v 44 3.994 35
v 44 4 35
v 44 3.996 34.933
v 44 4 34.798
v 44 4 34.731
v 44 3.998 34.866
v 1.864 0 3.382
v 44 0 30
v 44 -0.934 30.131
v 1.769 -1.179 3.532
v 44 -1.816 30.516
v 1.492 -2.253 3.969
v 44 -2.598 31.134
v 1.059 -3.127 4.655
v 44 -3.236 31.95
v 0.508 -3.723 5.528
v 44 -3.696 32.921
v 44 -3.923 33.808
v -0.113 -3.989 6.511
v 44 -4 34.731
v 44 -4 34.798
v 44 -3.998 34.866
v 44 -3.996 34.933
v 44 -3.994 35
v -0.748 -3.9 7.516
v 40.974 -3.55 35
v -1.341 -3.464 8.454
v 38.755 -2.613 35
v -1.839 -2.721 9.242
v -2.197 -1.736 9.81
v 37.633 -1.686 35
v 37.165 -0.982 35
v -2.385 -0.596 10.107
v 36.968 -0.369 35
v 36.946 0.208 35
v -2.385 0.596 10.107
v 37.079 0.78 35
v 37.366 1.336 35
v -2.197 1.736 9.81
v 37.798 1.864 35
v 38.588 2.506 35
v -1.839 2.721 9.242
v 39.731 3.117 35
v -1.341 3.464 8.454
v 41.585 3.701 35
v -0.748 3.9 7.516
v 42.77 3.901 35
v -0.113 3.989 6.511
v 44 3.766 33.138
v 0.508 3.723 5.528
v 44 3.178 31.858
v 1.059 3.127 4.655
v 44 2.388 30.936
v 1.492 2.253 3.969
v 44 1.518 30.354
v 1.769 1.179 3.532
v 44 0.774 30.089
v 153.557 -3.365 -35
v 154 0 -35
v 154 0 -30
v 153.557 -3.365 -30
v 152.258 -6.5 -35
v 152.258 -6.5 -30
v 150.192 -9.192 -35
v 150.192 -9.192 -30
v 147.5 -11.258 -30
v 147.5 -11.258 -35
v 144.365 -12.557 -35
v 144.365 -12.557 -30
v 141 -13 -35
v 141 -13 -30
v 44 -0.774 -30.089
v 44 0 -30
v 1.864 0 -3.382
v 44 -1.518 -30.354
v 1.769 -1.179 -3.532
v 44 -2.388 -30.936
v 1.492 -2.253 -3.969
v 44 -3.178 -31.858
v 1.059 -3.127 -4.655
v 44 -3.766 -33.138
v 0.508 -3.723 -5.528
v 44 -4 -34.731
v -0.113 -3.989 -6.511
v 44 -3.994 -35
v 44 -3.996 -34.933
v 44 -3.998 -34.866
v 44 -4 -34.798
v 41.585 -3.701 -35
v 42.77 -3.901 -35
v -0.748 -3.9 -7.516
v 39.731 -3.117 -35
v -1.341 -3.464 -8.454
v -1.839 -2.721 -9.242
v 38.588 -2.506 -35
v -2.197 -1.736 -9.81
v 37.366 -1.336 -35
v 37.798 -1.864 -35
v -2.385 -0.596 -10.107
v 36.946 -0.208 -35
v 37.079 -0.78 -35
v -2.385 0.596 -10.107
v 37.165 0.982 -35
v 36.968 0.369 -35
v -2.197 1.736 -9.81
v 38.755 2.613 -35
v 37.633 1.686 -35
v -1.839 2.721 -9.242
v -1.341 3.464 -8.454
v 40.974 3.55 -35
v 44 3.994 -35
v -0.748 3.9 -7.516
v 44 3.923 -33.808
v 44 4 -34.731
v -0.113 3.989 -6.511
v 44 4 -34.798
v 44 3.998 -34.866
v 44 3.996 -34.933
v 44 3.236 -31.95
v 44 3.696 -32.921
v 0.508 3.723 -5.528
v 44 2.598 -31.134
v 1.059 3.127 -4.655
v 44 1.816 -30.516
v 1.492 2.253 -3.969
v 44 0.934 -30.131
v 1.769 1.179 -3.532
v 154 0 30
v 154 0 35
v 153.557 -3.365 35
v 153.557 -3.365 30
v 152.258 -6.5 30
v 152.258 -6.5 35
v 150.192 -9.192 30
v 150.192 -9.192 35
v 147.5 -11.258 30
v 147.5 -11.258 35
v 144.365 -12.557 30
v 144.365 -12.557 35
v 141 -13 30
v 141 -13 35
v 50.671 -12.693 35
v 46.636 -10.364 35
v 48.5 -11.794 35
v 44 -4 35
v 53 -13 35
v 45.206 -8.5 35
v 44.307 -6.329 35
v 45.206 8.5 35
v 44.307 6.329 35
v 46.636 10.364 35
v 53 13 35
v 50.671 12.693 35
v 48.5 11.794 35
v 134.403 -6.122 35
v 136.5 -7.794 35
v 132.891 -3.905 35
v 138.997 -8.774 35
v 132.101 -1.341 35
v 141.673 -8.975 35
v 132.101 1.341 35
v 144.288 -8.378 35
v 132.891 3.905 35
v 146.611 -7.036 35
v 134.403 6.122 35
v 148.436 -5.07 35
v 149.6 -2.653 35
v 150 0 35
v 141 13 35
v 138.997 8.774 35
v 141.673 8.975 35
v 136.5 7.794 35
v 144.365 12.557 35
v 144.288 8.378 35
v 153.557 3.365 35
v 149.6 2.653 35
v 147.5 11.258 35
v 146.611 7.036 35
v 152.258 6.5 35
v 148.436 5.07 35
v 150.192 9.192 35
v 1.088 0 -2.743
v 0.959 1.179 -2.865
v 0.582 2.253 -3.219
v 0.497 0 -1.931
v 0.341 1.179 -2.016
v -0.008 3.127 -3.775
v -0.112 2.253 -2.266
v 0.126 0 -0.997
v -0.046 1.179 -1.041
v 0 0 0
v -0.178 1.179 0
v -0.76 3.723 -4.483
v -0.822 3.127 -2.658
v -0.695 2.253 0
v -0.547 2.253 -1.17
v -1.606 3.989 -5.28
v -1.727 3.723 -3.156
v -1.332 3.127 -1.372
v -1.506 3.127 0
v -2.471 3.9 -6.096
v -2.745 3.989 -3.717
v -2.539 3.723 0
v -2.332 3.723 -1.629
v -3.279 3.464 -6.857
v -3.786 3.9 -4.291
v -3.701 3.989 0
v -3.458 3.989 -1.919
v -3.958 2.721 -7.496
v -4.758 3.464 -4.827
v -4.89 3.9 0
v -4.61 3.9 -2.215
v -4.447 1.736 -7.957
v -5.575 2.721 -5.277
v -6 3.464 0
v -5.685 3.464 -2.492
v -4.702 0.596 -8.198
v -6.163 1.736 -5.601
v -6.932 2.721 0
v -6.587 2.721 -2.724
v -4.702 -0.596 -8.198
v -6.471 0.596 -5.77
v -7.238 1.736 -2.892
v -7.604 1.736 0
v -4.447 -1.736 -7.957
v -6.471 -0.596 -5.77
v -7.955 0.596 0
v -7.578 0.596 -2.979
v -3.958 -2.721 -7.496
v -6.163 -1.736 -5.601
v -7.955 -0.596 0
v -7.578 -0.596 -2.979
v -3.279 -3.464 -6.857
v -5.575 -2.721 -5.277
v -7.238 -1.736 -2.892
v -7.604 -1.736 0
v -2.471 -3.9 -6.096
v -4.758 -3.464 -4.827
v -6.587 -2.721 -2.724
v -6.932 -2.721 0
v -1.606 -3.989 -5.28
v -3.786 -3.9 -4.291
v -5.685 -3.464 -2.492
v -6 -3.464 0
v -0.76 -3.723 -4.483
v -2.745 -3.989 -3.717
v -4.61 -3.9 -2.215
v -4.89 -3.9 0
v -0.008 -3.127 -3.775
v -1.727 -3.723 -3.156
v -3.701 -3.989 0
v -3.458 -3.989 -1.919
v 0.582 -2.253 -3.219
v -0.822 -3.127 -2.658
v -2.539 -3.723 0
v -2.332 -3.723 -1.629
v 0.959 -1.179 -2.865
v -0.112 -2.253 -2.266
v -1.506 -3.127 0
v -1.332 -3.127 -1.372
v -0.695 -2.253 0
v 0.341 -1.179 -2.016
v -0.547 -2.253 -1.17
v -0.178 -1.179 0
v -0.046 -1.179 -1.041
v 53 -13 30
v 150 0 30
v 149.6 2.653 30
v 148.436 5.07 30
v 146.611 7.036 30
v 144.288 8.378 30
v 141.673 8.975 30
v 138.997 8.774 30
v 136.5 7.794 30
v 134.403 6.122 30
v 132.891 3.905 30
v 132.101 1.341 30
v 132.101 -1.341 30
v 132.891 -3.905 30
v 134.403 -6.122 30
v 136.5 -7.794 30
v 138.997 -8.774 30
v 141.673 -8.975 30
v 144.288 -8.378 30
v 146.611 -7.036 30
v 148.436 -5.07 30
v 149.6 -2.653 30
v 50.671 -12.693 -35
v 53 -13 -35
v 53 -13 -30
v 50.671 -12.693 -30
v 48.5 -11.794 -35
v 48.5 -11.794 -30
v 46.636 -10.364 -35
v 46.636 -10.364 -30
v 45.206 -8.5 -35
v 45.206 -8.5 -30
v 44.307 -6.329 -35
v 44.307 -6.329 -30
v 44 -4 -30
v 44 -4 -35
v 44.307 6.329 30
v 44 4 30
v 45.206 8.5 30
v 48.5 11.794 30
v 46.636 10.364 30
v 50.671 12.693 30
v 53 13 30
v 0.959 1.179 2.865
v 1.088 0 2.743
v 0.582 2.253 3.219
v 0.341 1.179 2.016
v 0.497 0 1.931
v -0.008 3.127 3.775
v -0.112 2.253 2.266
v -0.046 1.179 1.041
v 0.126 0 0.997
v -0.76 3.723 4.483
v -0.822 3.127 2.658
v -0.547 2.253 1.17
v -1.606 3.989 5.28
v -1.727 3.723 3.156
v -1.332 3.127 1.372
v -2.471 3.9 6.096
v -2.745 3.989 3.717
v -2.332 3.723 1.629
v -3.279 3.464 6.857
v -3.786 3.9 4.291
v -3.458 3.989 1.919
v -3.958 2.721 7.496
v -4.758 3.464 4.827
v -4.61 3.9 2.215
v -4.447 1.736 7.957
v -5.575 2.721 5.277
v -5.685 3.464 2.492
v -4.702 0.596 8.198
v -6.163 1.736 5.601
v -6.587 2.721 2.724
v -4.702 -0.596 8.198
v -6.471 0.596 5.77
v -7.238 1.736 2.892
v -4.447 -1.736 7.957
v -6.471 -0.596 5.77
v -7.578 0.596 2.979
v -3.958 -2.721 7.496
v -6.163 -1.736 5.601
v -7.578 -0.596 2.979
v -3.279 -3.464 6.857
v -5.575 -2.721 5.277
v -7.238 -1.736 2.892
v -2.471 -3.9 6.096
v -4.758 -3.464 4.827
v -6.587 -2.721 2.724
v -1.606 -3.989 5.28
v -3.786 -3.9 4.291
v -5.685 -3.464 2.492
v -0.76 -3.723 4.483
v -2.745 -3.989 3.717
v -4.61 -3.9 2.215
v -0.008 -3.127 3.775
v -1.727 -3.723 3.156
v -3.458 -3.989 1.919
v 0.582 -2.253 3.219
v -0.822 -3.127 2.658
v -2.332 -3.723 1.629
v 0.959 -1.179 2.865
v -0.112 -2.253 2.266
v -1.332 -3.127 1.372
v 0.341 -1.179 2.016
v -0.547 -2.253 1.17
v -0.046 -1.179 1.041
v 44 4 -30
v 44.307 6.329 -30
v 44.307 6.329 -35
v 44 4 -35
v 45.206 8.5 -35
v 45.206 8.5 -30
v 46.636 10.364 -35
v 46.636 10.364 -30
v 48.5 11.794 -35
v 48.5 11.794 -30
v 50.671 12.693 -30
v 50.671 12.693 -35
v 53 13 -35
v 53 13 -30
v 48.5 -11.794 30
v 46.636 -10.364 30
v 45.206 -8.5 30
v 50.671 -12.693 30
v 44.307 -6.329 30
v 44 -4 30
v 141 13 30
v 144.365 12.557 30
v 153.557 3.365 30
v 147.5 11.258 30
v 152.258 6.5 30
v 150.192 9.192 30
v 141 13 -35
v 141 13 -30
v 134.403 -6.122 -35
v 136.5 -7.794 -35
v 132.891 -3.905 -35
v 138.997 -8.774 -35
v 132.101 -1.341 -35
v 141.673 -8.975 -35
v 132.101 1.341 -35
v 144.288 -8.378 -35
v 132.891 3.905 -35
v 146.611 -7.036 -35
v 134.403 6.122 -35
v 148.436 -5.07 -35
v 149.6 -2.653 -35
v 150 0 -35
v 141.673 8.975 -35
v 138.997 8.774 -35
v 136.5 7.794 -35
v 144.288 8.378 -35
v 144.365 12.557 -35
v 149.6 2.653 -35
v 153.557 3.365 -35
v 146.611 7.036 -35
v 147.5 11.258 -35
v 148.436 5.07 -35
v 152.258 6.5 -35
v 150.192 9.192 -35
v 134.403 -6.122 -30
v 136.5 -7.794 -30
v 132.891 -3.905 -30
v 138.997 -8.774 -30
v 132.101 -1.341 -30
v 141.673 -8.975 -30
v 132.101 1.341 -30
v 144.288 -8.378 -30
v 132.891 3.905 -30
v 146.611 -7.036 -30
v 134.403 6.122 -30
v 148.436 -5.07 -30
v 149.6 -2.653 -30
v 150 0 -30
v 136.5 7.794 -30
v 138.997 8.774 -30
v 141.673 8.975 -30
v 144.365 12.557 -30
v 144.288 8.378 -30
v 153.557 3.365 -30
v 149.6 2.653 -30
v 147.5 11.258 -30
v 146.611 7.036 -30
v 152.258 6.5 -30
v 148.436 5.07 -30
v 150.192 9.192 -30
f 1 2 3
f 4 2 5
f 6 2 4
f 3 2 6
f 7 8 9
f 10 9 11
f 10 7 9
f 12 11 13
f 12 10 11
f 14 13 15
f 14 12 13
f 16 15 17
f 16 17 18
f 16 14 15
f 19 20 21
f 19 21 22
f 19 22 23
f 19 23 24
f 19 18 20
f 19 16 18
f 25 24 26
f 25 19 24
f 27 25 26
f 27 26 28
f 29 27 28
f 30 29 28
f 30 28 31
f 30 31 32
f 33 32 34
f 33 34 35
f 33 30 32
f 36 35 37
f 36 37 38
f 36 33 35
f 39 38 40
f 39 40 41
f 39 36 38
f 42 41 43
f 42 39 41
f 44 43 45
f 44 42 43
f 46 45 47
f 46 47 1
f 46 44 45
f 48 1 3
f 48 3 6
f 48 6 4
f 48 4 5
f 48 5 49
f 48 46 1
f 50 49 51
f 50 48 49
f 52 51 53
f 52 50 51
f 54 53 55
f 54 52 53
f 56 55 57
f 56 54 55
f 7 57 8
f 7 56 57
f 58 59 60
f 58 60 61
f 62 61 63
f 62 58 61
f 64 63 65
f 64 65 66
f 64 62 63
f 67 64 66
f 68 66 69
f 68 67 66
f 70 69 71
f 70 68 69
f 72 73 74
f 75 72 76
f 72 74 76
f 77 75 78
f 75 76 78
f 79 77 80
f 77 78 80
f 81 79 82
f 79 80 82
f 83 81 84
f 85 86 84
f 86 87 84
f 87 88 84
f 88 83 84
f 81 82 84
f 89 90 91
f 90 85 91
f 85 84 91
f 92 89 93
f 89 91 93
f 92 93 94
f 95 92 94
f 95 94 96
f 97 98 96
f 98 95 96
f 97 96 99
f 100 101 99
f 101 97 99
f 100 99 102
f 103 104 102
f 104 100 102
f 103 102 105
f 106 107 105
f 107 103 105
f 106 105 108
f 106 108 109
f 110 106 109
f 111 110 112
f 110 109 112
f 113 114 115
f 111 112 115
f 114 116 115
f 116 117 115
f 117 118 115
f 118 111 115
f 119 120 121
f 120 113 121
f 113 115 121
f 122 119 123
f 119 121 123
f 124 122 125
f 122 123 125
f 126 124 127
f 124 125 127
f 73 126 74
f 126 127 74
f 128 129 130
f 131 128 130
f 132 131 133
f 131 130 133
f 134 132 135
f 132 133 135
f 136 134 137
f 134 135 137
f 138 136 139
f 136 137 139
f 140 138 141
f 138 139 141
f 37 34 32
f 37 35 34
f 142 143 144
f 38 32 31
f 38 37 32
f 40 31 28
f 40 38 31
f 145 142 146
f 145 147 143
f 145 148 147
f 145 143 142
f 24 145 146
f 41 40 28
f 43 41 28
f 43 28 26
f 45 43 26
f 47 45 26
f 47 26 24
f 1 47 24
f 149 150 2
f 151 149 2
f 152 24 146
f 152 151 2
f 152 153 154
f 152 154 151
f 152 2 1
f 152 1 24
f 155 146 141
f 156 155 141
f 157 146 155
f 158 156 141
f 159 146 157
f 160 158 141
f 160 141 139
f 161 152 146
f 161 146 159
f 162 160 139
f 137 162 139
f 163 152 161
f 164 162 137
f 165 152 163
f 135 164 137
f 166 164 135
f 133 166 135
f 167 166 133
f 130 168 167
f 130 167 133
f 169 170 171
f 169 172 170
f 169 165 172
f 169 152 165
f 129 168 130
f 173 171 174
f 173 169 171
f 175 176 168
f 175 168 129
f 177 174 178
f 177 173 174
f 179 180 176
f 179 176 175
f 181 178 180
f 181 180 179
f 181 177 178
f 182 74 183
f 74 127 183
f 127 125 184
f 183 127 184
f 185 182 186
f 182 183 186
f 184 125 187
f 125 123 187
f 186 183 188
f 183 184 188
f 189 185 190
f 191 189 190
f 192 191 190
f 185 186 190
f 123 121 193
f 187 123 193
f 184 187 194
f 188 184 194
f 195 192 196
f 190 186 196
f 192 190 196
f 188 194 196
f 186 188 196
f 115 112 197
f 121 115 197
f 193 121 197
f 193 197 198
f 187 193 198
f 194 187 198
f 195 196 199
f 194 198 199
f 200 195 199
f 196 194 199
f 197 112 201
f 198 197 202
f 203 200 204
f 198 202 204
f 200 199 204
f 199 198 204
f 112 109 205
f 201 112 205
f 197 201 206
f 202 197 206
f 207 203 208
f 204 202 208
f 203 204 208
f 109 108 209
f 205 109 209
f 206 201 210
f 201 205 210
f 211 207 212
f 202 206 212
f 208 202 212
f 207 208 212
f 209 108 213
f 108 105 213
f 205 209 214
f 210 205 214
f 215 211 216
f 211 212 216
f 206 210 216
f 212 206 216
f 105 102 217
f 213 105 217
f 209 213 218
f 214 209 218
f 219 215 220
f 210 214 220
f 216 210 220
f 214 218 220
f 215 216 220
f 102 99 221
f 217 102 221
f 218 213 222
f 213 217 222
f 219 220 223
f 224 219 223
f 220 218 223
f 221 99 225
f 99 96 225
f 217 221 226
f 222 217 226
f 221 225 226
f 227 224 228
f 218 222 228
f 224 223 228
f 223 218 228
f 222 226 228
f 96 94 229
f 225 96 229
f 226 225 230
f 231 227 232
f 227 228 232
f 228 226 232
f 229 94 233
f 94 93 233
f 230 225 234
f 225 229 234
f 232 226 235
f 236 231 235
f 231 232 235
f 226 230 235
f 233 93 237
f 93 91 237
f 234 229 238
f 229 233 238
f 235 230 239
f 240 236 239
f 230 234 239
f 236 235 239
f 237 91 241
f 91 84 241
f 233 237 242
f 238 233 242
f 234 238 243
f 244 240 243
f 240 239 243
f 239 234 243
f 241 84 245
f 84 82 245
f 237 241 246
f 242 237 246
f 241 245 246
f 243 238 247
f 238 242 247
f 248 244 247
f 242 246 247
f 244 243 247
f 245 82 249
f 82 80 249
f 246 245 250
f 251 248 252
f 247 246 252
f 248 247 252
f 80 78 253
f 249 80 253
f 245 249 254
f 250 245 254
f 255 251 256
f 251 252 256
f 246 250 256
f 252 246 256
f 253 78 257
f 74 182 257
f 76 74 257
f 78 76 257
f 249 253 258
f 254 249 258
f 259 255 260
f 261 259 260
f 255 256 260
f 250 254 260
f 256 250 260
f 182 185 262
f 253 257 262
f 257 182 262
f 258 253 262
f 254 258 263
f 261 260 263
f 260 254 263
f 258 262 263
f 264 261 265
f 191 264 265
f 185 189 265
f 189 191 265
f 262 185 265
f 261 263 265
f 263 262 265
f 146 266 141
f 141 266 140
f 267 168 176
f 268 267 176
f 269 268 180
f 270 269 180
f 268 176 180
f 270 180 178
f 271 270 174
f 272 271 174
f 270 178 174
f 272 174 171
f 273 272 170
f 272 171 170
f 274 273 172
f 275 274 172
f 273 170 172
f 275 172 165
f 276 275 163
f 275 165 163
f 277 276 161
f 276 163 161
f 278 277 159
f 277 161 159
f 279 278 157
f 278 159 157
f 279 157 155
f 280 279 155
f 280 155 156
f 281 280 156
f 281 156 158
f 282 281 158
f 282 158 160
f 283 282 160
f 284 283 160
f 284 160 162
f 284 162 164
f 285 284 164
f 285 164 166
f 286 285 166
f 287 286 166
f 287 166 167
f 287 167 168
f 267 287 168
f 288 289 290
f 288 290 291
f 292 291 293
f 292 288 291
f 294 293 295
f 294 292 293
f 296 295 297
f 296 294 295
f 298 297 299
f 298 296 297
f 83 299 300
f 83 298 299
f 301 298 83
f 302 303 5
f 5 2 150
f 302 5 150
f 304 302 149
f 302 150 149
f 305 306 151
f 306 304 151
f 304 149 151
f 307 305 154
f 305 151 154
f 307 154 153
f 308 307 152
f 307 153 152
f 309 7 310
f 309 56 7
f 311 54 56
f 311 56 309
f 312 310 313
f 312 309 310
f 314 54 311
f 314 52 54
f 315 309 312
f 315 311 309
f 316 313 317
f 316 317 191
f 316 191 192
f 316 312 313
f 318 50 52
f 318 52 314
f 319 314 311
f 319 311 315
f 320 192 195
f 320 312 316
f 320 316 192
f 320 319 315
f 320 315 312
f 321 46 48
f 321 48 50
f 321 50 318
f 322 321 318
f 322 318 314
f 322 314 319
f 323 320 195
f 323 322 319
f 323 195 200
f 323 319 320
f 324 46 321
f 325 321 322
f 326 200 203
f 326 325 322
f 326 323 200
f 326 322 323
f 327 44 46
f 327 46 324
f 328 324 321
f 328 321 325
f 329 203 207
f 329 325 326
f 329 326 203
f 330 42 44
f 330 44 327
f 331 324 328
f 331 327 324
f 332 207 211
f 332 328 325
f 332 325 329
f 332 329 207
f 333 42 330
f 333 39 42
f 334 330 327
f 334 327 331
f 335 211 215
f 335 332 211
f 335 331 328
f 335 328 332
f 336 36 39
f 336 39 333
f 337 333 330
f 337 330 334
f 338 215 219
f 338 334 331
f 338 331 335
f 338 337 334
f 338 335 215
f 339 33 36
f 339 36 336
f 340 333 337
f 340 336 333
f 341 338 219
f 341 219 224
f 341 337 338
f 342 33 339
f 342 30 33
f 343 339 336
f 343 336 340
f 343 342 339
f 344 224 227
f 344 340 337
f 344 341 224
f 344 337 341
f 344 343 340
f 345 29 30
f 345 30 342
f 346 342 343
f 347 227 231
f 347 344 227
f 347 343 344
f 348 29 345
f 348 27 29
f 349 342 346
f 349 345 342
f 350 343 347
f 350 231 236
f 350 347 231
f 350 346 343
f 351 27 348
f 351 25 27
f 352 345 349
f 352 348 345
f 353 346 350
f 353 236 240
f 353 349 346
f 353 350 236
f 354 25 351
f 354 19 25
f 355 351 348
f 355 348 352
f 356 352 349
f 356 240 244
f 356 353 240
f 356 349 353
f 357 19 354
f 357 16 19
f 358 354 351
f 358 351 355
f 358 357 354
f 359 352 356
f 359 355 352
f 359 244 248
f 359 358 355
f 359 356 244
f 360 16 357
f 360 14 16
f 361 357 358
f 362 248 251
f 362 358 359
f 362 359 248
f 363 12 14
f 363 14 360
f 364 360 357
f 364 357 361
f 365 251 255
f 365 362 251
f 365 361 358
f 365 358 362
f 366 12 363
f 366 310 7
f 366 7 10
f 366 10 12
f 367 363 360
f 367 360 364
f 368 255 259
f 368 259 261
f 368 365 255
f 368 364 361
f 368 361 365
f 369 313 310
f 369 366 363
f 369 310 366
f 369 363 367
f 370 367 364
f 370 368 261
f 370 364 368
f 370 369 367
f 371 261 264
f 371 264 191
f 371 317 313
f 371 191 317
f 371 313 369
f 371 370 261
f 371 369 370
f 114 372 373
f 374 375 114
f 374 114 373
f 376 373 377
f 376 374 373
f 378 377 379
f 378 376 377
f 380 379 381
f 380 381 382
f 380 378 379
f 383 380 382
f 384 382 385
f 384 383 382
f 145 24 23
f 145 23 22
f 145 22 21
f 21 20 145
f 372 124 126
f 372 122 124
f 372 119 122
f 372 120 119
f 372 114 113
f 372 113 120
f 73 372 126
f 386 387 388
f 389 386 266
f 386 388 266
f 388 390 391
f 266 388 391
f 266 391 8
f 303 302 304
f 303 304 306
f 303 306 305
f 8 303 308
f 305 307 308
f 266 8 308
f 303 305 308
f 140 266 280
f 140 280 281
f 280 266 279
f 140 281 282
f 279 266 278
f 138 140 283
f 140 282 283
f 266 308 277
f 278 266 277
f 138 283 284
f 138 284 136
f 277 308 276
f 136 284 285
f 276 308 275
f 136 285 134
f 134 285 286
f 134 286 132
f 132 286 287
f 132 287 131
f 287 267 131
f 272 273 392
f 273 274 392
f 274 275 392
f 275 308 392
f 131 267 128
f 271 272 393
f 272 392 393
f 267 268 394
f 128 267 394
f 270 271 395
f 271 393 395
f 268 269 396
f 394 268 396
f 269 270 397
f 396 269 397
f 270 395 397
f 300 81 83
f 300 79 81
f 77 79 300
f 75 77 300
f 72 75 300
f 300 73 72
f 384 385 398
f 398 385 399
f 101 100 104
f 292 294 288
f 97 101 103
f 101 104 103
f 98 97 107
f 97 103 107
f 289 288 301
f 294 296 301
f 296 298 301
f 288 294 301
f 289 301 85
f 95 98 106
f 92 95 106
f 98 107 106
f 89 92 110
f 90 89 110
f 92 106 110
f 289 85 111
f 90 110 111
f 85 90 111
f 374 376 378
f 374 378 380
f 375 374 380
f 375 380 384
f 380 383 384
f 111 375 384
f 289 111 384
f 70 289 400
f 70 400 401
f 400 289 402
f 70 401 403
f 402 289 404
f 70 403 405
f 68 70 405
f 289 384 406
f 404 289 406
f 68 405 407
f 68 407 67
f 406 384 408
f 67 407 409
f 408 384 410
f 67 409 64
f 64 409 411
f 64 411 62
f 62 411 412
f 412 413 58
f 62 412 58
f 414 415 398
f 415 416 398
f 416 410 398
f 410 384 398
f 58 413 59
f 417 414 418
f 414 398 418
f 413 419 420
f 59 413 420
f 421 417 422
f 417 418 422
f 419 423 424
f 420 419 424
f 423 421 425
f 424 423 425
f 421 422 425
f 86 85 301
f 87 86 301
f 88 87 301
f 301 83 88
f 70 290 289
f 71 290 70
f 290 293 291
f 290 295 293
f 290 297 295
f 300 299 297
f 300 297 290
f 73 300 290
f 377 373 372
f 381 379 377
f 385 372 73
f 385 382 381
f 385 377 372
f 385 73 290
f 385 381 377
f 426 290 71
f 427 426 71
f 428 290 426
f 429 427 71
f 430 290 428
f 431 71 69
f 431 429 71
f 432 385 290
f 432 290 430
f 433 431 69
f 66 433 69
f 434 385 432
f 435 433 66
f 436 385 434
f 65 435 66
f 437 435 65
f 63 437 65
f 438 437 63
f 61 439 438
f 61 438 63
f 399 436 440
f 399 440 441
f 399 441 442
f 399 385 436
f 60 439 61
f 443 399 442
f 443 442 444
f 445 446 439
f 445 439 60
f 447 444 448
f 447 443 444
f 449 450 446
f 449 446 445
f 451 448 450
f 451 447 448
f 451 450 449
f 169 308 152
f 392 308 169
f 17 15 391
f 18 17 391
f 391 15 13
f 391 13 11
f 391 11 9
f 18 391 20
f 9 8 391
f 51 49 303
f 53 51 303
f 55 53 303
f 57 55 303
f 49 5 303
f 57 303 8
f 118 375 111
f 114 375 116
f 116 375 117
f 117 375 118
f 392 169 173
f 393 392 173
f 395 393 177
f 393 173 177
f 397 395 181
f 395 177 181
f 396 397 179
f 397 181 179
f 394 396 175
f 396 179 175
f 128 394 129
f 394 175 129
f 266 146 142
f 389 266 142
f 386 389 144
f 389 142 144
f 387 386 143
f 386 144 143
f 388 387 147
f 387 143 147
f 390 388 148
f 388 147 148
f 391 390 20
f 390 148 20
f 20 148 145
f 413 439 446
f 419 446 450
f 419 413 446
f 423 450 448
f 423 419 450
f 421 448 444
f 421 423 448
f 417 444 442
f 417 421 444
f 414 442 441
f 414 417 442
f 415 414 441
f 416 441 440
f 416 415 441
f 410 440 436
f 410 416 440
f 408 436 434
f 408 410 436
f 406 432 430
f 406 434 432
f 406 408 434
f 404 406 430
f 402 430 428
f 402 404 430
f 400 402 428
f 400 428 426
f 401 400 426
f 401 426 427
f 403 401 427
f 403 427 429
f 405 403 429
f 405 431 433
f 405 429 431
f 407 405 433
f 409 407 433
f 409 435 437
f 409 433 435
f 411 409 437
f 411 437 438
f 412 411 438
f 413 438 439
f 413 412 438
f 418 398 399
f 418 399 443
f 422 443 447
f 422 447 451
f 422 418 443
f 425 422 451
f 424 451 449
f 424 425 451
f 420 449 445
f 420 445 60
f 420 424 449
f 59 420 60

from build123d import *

# Parameters (mm, degrees)
SKETCH2_R           = 4
CUT_EXTRUDE1_DEPTH  = 10
SKETCH5_W           = 110
SKETCH5_H           = 5
BOSS_EXTRUDE1_DEPTH = 13
SKETCH6_R           = 9
CUT_EXTRUDE2_DEPTH  = 13
CUT_EXTRUDE3_DEPTH  = 10


with BuildPart() as part:
    # Sweep1: sweep along a path in Sketch1
    with BuildLine(Plane(origin=(0, 0, 0), x_dir=(1, 0, 0), z_dir=(0, 1, 0))) as sweep1_path:
        Line((52.389202821, -40.03089611), (-0.272615345, -6.763487127))
        ThreePointArc((-0.272615345, -6.763487127), (-3.006458548, -3.861287171), (-4, 0))
    # Sketch2 → Sweep1 (sweep)
    with BuildSketch(Plane.XY):
        with Locations((-4, 0)):
            Circle(SKETCH2_R)
    sweep1 = sweep(path=sweep1_path.line)

    # Sketch4 → Cut-Extrude1 (cut, symmetric)
    with BuildSketch(Plane(origin=(0, 0, 0), x_dir=(1, 0, 0), z_dir=(0, 1, 0))):
        Polygon((44, -35), (34.597308022, -35), (44, -46.531698577), (57.177061071, -46.531698577), (57.177061071, -30), (44, -30), align=None)
    cut_extrude1 = extrude(amount=CUT_EXTRUDE1_DEPTH, both=True, mode=Mode.SUBTRACT)

    # Sketch5 → Boss-Extrude1 (add, symmetric)
    with BuildSketch(Plane(origin=(0, 0, 0), x_dir=(1, 0, 0), z_dir=(0, 1, 0))):
        with Locations((99, -32.5)):
            Rectangle(SKETCH5_W, SKETCH5_H)
    boss_extrude1 = extrude(amount=BOSS_EXTRUDE1_DEPTH, both=True)

    # Sketch6 → Cut-Extrude2 (cut, symmetric)
    with BuildSketch(Plane.XY.offset(35)):
        with Locations((141, 0)):
            Circle(SKETCH6_R)
        with BuildLine():
            Line((53, 13), (52.778372403, 14.264161609))
            Line((52.778372403, 14.264161609), (42.606717514, 14.264161609))
            Line((42.606717514, 14.264161609), (42.848324519, 6.72602307))
            Line((42.848324519, 6.72602307), (44, 4))
            ThreePointArc((44, 4), (46.636038969, 10.363961031), (53, 13))
        make_face()
    cut_extrude2 = extrude(amount=CUT_EXTRUDE2_DEPTH, both=True, mode=Mode.SUBTRACT)

    # Sketch7 → Cut-Extrude3 (cut)
    with BuildSketch(Plane.XY.offset(35)):
        with BuildLine():
            Line((44, -13), (53, -13))
            ThreePointArc((53, -13), (46.636038969, -10.363961031), (44, -4))
            Line((44, -4), (44, -13))
        make_face()
        with BuildLine():
            ThreePointArc((154, 1.44e-07), (150.192388206, -9.192388104), (141, -13))
            Line((141, -13), (154, -13))
            Line((154, -13), (154, 1.44e-07))
        make_face()
        with BuildLine():
            ThreePointArc((141, 13), (150.192388104, 9.192388206), (154, 1.44e-07))
            Line((154, 1.44e-07), (154, 13))
            Line((154, 13), (141, 13))
        make_face()
    cut_extrude3 = extrude(amount=-CUT_EXTRUDE3_DEPTH, mode=Mode.SUBTRACT)

    # Mirror1: Sweep1, Cut-Extrude1, Boss-Extrude1, Cut-Extrude2, Cut-Extrude3 across plane
    add(sweep1.mirror(Plane(origin=(-4, 0, 0), x_dir=(1, 0, 0), z_dir=(0, 0, 1))))
    add(cut_extrude1.mirror(Plane(origin=(-4, 0, 0), x_dir=(1, 0, 0), z_dir=(0, 0, 1))), mode=Mode.SUBTRACT)
    add(boss_extrude1.mirror(Plane(origin=(-4, 0, 0), x_dir=(1, 0, 0), z_dir=(0, 0, 1))))
    add(cut_extrude2.mirror(Plane(origin=(-4, 0, 0), x_dir=(1, 0, 0), z_dir=(0, 0, 1))), mode=Mode.SUBTRACT)
    add(cut_extrude3.mirror(Plane(origin=(-4, 0, 0), x_dir=(1, 0, 0), z_dir=(0, 0, 1))), mode=Mode.SUBTRACT)


solid = part.part
